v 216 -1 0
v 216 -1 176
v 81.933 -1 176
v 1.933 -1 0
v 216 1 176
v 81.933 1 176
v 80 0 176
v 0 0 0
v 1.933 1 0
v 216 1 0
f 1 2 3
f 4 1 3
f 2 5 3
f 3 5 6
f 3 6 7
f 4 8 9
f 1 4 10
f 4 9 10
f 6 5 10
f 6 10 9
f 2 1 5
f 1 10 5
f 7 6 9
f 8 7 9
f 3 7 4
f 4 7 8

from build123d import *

# Parameters (mm, degrees)
BOSS_EXTRUDE1_DEPTH = 1
CHAMFER1_SIZE       = 1.76
CHAMFER1_SIZE2      = 1
CHAMFER2_SIZE2      = 1.76
CHAMFER2_SIZE       = 1


with BuildPart() as part:
    # Sketch1 → Boss-Extrude1 (new, symmetric)
    with BuildSketch(Plane(origin=(0, 0, 0), x_dir=(1, 0, 0), z_dir=(0, 1, 0))):
        Polygon((0, 0), (216, 0), (216, -176), (80, -176), align=None)
    extrude(amount=BOSS_EXTRUDE1_DEPTH, both=True)

    # Chamfer1
    chamfer1_edges = [part.edges().sort_by_distance(p)[0] for p in [
        (40, -1, 88),
    ]]
    chamfer1_side = [part.faces().sort_by_distance(p)[0] for p in [
        (126.484848485, -1, 81.333333333),
    ]]
    chamfer(chamfer1_edges, length=CHAMFER1_SIZE, length2=CHAMFER1_SIZE2, reference=chamfer1_side[0])

    # Chamfer2
    chamfer2_edges = [part.edges().sort_by_distance(p)[0] for p in [
        (40, 1, 88),
    ]]
    chamfer2_side = [part.faces().sort_by_distance(p)[0] for p in [
        (40, 0.98, 88),
    ]]
    chamfer(chamfer2_edges, length=CHAMFER2_SIZE - 0.0001, length2=CHAMFER2_SIZE2 - 0.0001, reference=chamfer2_side[0])  # a hair under: the kernel refuses the full size


solid = part.part
